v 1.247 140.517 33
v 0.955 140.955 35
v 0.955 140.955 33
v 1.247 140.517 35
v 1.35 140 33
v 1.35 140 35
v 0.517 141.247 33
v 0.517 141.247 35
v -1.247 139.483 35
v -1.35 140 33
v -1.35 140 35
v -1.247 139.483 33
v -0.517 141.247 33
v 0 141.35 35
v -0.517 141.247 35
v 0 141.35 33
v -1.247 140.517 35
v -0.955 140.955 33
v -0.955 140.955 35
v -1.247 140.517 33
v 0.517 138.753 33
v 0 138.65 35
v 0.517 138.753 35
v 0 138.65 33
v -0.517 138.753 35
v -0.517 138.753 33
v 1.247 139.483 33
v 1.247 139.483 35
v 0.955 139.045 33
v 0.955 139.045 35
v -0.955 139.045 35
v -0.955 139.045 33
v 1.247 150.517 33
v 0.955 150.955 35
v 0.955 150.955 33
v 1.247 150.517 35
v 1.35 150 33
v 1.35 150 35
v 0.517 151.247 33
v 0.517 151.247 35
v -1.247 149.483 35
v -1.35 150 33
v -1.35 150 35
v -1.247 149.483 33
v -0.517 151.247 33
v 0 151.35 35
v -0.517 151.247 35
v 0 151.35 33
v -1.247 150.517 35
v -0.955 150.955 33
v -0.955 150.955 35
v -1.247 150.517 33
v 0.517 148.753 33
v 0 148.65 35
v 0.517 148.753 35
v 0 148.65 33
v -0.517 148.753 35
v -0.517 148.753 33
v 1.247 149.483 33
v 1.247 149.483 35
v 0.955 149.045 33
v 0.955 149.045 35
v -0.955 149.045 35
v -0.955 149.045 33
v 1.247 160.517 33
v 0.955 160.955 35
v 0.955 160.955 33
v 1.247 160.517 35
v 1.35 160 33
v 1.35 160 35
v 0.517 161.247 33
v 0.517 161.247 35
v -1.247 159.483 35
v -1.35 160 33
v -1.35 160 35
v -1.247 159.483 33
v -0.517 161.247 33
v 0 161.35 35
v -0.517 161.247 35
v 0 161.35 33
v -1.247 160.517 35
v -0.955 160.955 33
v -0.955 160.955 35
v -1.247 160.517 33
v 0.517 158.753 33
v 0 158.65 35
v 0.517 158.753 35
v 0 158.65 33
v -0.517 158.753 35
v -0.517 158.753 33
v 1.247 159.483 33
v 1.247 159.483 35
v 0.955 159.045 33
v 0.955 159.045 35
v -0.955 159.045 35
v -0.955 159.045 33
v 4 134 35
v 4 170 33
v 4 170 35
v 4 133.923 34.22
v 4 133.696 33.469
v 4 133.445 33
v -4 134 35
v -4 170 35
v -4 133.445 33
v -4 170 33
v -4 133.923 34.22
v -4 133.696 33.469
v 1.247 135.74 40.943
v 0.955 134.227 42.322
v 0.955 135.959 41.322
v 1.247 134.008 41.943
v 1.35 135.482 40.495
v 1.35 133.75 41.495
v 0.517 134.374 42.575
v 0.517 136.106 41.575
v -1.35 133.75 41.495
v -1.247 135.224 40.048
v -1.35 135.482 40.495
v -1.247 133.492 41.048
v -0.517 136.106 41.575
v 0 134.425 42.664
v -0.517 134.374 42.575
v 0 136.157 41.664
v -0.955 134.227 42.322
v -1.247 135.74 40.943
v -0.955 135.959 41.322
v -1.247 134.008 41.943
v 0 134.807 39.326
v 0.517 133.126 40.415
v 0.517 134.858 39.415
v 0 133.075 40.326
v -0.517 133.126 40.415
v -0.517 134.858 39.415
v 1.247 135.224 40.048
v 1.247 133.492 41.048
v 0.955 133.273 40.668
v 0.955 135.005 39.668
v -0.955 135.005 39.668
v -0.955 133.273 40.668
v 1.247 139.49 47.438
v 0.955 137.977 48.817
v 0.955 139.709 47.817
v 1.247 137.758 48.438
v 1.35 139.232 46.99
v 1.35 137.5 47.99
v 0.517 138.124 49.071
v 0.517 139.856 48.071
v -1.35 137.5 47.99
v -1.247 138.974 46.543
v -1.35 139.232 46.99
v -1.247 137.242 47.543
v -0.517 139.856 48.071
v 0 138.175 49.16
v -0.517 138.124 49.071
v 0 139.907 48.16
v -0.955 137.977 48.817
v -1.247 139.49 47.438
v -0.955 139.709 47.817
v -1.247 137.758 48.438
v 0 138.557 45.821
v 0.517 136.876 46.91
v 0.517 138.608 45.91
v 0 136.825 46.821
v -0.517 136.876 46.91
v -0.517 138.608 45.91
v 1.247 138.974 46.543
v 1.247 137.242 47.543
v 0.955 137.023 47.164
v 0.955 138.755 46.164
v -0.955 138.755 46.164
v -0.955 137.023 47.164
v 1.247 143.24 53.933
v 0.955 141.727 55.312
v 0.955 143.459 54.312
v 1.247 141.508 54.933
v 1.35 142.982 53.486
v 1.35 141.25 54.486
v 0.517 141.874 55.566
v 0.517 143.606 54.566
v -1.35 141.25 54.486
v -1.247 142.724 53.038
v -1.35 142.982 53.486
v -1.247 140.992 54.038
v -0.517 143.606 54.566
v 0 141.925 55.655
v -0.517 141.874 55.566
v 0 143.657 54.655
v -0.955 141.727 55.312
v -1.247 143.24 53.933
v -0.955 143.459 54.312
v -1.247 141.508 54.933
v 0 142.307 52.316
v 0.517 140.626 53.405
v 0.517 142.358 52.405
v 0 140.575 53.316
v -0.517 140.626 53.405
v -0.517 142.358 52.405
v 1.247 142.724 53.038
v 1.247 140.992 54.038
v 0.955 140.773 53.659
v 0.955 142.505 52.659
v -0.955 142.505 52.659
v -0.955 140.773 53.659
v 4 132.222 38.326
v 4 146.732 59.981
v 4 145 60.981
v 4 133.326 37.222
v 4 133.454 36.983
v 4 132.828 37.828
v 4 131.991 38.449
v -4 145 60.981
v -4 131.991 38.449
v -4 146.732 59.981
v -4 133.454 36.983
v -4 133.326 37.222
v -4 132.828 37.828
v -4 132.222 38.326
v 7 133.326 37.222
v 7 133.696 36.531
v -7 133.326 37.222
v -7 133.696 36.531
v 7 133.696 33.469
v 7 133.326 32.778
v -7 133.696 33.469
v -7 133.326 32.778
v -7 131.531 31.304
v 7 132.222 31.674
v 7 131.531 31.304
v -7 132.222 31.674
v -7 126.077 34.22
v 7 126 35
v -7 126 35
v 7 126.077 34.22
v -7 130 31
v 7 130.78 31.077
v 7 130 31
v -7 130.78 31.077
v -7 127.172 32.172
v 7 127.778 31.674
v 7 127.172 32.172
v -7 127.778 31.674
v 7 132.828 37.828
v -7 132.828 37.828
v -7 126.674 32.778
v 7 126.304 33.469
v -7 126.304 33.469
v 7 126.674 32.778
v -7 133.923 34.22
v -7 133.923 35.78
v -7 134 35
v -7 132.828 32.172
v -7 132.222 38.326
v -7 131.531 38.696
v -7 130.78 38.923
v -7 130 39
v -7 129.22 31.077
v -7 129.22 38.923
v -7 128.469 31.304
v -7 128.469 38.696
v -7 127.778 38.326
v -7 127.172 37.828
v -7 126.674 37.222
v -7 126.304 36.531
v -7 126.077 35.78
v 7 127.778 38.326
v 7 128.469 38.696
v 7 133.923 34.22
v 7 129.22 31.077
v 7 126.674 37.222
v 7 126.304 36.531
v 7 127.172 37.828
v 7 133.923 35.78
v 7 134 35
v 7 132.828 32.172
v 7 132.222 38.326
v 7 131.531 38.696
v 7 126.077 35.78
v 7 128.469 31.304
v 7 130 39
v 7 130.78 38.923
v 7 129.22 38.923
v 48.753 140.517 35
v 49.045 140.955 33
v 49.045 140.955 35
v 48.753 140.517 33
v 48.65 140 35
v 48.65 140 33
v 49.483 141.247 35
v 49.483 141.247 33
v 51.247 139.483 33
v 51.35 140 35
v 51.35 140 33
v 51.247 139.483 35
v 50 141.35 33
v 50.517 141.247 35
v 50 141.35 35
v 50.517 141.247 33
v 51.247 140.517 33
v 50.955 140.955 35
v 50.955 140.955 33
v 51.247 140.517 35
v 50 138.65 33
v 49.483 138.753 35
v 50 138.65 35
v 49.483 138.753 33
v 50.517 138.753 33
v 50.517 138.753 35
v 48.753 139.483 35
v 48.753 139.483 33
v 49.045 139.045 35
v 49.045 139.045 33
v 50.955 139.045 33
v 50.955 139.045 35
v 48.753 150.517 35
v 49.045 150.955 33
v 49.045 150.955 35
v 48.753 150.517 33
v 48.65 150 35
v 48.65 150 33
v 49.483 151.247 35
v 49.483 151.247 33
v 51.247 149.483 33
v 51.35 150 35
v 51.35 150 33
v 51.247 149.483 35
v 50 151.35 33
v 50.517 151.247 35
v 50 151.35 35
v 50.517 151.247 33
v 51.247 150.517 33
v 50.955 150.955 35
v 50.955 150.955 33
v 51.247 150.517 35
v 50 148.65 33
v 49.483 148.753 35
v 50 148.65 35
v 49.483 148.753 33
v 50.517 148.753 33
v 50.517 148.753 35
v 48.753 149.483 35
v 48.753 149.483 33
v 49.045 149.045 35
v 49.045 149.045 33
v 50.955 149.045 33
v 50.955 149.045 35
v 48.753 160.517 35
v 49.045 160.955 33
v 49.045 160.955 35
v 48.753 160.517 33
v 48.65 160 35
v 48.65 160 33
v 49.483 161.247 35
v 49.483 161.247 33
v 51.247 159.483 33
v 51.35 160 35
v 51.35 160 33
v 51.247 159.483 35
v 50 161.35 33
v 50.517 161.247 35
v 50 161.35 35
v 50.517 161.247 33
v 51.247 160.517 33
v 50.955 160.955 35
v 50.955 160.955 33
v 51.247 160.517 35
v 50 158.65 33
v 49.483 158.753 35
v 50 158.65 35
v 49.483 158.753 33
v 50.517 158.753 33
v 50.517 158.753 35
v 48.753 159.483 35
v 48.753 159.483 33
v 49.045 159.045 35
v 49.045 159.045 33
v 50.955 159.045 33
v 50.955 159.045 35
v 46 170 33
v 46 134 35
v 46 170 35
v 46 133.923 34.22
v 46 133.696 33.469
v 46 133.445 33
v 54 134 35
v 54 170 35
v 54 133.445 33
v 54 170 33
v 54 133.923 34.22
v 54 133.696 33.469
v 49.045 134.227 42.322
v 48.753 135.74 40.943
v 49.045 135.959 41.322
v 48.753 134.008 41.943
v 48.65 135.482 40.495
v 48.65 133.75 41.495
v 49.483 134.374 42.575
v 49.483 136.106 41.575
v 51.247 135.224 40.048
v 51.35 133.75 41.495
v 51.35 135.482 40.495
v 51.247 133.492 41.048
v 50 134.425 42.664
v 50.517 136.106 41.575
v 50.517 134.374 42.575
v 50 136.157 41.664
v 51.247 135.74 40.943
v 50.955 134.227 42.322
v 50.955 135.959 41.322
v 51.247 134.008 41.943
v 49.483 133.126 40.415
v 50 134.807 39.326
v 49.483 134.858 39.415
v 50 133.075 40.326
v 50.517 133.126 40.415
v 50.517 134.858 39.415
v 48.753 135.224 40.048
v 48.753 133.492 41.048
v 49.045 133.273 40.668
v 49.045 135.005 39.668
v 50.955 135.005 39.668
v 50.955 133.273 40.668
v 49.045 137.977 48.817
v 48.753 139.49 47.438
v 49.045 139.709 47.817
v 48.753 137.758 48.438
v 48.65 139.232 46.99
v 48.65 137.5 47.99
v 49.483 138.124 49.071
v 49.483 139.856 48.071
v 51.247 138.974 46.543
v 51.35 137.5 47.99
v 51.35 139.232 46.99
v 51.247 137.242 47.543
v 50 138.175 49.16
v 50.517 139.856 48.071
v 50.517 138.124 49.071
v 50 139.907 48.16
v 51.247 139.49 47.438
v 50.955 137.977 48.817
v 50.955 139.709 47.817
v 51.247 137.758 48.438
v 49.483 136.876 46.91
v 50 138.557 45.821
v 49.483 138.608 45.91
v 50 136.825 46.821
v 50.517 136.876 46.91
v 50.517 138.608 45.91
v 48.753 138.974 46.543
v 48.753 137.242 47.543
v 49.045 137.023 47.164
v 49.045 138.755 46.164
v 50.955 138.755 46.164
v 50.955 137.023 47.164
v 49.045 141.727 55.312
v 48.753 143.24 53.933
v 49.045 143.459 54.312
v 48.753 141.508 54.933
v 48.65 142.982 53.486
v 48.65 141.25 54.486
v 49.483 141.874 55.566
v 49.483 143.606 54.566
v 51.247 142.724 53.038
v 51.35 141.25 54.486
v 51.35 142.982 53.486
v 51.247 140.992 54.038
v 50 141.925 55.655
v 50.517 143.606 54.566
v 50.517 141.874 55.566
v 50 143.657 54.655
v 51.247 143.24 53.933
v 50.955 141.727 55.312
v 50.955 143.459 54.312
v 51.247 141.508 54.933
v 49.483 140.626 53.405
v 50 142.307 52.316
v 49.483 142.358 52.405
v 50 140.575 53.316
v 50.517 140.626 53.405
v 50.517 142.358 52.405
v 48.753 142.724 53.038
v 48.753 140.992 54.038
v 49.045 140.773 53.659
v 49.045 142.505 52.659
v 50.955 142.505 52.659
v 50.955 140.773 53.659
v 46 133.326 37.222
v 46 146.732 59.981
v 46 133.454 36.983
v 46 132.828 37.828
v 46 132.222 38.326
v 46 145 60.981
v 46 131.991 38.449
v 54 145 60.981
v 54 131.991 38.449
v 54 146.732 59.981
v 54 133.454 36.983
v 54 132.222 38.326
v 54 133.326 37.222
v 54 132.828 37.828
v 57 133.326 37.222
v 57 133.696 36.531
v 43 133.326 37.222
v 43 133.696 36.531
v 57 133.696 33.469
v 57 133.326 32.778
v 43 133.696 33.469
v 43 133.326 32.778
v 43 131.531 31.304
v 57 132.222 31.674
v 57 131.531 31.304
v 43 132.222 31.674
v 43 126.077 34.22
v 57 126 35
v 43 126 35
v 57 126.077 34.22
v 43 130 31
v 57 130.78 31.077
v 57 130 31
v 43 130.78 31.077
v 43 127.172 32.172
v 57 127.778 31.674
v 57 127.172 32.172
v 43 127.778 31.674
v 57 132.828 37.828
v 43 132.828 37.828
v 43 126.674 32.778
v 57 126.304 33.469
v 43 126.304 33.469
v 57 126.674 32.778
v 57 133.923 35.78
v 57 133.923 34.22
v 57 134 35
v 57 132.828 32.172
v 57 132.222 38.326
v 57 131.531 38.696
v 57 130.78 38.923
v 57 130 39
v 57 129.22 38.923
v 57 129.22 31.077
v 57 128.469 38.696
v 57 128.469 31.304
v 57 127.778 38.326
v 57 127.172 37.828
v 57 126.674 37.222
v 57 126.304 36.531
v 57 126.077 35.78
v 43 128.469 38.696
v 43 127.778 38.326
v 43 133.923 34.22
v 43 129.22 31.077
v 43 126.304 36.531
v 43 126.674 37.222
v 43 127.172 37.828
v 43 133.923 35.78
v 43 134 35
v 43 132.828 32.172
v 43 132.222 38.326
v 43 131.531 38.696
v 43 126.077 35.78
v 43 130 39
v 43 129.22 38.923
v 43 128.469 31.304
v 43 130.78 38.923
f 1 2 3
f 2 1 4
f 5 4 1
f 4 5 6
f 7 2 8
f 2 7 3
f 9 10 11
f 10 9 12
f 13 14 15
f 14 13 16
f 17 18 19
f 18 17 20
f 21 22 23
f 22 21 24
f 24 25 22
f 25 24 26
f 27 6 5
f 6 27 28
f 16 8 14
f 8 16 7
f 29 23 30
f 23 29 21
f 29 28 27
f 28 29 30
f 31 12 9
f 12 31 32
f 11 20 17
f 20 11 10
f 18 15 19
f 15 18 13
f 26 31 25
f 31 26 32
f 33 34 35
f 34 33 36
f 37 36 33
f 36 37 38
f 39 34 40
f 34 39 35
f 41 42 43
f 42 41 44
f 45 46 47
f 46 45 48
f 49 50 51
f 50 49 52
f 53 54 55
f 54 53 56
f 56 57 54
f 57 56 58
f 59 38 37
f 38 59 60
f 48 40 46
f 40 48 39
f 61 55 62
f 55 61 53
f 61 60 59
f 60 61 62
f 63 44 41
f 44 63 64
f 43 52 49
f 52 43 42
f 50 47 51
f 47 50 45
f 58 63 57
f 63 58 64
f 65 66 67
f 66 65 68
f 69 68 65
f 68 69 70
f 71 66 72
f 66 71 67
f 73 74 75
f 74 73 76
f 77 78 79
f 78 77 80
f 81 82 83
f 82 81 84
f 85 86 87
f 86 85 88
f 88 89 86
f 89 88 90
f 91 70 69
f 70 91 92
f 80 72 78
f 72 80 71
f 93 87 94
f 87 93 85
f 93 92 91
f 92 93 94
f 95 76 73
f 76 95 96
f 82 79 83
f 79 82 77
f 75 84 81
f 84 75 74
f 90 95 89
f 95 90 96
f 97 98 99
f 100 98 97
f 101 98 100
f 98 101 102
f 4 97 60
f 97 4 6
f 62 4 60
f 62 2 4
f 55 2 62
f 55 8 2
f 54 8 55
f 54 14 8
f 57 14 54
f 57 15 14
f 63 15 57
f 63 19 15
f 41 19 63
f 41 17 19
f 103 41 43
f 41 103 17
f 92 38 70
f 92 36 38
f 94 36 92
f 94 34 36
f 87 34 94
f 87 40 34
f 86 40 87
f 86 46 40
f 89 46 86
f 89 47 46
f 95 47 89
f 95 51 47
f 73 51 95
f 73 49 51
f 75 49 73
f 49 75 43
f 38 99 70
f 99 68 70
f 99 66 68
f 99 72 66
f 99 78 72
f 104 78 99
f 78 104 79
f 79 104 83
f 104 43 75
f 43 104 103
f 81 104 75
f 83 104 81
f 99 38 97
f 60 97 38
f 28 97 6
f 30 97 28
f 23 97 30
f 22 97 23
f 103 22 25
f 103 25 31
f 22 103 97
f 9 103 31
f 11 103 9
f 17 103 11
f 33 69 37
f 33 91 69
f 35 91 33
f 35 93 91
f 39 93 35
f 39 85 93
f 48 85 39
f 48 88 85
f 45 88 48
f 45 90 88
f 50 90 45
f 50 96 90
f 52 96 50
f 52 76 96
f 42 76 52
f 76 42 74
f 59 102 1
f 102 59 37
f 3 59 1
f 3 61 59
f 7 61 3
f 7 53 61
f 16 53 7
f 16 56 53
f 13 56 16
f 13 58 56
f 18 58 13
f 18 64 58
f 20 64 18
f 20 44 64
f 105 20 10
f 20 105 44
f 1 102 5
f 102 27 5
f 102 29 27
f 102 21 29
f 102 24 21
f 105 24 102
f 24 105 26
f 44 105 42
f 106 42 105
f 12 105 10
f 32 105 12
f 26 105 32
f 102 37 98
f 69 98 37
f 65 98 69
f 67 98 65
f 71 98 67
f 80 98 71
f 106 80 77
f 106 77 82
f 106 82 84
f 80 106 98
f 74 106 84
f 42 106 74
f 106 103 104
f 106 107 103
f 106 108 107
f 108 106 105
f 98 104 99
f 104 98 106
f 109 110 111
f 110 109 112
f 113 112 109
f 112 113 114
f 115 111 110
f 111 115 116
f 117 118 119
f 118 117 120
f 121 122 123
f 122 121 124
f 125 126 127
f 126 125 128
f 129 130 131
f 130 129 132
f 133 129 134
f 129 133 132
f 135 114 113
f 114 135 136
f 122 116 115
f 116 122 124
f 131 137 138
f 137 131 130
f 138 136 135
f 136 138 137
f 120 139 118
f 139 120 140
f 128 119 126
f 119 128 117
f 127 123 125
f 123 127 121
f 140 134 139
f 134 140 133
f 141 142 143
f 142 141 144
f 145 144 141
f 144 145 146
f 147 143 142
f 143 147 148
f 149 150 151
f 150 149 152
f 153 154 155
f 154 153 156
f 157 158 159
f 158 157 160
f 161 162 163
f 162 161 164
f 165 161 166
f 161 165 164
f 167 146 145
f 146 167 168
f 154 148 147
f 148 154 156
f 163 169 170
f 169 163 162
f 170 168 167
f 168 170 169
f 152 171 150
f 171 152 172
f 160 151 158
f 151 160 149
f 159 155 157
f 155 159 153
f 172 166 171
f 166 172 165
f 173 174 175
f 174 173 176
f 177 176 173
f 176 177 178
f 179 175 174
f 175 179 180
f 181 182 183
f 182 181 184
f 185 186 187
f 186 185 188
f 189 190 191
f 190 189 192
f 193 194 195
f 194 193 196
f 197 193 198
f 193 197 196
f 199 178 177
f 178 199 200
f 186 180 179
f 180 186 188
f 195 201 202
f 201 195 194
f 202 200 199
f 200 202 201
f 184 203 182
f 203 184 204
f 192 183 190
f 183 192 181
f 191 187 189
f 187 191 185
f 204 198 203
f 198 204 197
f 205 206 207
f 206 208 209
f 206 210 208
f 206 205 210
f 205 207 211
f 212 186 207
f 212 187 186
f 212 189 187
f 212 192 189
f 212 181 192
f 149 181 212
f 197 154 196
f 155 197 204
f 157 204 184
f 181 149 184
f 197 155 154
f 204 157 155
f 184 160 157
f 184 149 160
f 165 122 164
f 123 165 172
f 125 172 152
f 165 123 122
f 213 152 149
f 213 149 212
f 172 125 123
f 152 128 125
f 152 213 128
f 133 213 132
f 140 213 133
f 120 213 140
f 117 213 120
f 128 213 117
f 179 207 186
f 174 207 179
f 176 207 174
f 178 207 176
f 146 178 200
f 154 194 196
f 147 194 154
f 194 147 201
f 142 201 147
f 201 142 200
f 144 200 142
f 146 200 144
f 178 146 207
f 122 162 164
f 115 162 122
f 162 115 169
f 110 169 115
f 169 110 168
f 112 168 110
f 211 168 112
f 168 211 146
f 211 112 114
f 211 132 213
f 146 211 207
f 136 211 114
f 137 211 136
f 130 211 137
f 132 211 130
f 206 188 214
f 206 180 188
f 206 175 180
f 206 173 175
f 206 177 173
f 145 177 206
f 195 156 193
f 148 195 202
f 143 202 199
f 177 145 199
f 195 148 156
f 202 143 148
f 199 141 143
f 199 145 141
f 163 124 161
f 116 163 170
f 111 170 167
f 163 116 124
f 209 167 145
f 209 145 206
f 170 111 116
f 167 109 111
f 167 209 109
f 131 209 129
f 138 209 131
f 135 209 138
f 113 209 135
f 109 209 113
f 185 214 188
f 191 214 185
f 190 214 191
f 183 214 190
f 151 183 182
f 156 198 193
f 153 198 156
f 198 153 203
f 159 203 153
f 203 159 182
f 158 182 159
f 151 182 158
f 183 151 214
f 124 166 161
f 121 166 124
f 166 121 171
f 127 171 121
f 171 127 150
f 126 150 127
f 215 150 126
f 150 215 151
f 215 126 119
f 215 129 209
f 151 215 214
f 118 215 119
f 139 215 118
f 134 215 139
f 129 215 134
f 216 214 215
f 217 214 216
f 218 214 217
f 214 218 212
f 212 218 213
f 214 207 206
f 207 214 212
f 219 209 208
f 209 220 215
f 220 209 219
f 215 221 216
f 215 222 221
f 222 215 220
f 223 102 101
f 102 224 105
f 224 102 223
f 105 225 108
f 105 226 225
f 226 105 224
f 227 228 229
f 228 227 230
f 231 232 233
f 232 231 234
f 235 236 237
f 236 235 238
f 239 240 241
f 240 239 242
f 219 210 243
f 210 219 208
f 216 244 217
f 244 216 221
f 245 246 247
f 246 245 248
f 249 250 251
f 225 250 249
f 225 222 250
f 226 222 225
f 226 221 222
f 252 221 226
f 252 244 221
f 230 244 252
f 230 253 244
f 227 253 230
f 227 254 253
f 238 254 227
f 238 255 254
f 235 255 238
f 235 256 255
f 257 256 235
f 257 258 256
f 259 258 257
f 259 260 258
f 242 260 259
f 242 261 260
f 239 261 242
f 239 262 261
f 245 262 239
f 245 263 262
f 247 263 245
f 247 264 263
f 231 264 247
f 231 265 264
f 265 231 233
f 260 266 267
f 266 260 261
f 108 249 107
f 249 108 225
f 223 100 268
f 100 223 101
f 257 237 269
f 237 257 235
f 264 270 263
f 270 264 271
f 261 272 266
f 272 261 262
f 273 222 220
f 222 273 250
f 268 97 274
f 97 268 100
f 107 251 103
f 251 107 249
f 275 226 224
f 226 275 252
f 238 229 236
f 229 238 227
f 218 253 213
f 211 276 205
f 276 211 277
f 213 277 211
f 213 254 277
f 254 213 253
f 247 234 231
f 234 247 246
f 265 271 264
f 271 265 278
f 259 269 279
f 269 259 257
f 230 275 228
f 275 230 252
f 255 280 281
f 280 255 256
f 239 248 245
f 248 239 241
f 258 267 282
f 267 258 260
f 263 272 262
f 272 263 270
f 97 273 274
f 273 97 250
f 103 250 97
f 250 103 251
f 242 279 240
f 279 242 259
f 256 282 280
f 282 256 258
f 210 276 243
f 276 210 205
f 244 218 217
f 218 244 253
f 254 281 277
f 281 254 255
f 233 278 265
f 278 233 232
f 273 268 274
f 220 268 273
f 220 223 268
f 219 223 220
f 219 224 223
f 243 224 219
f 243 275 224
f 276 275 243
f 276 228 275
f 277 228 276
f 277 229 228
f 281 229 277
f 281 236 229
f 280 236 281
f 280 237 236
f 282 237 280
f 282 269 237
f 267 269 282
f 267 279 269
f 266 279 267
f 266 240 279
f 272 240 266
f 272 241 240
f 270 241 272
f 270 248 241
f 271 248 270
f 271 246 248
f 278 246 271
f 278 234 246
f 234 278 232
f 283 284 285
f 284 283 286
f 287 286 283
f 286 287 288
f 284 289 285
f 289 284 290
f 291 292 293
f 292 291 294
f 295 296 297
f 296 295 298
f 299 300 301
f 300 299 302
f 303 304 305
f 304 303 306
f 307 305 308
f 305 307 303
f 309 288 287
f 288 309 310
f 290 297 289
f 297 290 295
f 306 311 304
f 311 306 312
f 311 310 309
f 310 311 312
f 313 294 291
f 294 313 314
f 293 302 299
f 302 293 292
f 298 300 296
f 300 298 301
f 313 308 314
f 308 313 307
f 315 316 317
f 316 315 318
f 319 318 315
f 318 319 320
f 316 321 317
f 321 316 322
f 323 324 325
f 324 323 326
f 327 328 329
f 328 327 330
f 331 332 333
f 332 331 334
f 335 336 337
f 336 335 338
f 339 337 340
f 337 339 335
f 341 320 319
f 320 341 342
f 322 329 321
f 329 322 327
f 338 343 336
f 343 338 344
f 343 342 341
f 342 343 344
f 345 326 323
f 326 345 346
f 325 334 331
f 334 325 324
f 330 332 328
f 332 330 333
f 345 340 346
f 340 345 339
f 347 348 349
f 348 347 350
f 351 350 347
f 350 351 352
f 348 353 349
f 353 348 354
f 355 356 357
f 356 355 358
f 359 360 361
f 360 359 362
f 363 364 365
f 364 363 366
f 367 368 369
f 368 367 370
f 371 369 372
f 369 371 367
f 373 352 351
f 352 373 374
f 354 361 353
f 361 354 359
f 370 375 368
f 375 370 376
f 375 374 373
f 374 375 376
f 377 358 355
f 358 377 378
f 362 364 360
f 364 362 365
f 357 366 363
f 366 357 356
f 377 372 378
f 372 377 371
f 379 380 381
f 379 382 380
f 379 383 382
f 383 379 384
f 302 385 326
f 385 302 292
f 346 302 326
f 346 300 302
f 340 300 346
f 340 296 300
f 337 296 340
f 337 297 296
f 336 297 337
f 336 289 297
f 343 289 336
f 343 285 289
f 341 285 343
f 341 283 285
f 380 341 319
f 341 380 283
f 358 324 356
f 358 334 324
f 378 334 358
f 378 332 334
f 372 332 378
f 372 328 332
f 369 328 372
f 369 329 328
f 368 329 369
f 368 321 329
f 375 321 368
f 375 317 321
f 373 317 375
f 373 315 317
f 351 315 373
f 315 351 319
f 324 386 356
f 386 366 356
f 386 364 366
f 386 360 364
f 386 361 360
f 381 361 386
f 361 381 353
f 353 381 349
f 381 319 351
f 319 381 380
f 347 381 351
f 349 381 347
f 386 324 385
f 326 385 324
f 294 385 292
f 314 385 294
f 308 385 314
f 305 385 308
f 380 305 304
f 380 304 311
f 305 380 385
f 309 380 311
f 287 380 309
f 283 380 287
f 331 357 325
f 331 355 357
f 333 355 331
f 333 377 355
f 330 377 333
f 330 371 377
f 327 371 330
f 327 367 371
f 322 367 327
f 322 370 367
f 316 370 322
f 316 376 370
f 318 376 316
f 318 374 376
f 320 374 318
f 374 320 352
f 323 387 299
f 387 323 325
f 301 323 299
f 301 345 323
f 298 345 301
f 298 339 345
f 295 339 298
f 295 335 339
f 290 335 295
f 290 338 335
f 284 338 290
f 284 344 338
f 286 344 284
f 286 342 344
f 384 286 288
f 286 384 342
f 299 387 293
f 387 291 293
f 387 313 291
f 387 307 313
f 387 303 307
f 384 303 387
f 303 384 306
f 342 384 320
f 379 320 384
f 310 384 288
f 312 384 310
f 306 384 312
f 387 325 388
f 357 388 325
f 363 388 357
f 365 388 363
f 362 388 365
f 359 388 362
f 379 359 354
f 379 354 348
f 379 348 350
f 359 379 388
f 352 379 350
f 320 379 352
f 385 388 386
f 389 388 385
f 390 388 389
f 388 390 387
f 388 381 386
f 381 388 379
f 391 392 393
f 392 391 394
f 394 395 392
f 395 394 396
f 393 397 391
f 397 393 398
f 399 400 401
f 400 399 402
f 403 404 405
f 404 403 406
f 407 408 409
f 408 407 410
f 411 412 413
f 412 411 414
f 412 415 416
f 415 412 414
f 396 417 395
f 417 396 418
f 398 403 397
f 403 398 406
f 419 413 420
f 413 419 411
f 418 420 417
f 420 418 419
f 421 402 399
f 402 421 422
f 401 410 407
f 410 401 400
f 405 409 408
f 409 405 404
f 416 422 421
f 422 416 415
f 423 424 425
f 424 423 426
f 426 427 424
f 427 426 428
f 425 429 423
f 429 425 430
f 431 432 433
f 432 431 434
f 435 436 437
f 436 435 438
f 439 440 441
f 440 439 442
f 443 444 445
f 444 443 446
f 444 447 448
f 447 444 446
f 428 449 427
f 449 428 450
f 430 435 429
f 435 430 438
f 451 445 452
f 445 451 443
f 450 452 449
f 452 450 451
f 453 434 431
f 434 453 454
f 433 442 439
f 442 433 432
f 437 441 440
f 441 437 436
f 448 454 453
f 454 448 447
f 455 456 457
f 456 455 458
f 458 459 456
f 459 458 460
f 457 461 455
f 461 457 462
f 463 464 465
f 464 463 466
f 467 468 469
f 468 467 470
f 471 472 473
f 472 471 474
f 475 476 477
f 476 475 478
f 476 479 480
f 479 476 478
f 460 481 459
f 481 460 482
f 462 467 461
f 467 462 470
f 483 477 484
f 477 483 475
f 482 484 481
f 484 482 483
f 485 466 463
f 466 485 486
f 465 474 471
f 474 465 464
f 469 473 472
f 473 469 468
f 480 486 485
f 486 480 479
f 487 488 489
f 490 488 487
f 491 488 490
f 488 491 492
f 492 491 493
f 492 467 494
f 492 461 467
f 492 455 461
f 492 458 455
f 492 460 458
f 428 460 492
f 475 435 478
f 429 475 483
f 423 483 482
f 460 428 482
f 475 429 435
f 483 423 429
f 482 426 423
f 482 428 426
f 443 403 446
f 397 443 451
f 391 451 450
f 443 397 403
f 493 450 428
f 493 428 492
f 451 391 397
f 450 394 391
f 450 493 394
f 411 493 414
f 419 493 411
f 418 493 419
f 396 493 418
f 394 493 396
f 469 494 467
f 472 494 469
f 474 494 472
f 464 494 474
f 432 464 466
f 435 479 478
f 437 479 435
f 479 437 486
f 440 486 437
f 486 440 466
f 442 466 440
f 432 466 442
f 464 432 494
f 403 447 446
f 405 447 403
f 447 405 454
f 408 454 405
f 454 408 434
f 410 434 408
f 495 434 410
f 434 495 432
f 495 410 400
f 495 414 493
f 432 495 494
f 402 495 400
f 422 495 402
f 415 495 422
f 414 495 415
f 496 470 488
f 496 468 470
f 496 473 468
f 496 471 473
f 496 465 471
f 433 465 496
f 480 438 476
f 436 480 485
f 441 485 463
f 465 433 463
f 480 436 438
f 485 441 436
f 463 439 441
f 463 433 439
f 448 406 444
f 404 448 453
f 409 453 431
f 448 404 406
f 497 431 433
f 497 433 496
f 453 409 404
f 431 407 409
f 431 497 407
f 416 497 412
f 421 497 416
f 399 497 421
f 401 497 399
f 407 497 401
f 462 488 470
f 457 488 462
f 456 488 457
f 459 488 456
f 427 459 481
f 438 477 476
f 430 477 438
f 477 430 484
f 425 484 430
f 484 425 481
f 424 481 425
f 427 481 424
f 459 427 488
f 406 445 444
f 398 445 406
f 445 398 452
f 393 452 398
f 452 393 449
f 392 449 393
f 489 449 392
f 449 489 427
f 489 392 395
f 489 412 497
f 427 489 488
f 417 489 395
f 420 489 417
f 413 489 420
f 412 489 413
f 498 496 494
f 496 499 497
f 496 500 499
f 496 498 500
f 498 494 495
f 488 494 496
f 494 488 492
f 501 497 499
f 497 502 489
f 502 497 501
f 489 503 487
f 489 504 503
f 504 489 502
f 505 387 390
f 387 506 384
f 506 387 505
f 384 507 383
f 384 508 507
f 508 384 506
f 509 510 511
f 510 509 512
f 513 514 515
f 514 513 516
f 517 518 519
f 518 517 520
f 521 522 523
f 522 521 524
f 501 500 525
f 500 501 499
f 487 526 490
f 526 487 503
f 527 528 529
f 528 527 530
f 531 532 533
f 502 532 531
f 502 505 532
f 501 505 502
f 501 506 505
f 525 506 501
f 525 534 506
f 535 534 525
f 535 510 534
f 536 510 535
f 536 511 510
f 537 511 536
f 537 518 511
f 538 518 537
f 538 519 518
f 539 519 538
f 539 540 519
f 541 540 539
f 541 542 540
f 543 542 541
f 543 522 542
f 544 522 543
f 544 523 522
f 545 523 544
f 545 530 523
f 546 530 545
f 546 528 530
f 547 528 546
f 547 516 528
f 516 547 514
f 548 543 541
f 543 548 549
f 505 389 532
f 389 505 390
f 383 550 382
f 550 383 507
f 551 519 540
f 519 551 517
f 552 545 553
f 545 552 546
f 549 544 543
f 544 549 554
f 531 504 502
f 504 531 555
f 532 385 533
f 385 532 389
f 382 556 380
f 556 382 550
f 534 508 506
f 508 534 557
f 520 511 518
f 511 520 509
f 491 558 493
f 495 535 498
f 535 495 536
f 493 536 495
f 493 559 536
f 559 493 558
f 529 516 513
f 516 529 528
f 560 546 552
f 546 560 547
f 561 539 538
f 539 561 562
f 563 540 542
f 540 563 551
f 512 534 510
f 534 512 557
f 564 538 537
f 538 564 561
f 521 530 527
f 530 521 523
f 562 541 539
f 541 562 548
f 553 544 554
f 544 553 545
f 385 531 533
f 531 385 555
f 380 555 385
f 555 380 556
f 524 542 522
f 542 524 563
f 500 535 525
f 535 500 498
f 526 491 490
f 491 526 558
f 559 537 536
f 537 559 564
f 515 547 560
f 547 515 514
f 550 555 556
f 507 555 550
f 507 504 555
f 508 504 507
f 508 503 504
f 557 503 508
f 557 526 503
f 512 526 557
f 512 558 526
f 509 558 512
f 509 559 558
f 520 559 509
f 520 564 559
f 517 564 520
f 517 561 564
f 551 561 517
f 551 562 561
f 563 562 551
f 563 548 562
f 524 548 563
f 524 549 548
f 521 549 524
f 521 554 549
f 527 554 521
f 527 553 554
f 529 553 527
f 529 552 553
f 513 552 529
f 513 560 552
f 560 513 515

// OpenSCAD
// ThinkPad-style pivot hinge for Piputer
//
// Principle (matches ThinkPad design):
//   • Barrel visible at the back, sitting at the step-wall top-outer corner.
//   • Base arm : flat plate extending in +Y from barrel → screws into rear-zone top face.
//   • Lid arm  : flat plate extending in −Y from barrel when closed → screws into lid back.
//   • No integral plastic knuckles — hinge is a separate part, fastened to both shells.
//
// Barrel axis : X (left-right).
// Module origin : barrel centre.
//
// Placement in Piputer world (see main.scad):
//   Left  hinge: tp_hinge(open_angle, side="left",  x_pos= 20, bar_y=D_front, bar_z=H_rear)
//   Right hinge: tp_hinge(open_angle, side="right", x_pos=206, bar_y=D_front, bar_z=H_rear)
//
// Verification (closed, open_angle=0):
//   Base arm top face at Z=0 (module) = world Z=H_rear=35 — flush with rear-zone top. ✓
//   Lid arm: extends −Y from barrel → world Y=130..100, inside lid body at Z=35. ✓

eps = 0.01;

BARREL_D   =  8;    // barrel outer Ø
BARREL_L   = 14;    // barrel length, centred on X (±7 mm)
ARM_W      =  8;    // arm width along X
ARM_T      =  2;    // arm thickness (sits below barrel centre, Z=−ARM_T..0)
ARM_L_BASE = 40;    // base arm length in +Y (into rear zone, world Y=130..170)
ARM_L_LID  = 30;    // lid arm length in −Y (into lid body, world Y=100..130 when closed)
HOLE_D     =  2.7;  // M2.5 clearance bore

// Single flat arm with equally-spaced M2.5 clearance holes.
// Top face at Z=0 (barrel centre height); extends in +Y.
module _tp_arm(arm_l, n_holes=3) {
    difference() {
        translate([-ARM_W/2, 0, -ARM_T])
            cube([ARM_W, arm_l, ARM_T]);
        for (i = [1 : n_holes])
            translate([0, arm_l / (n_holes + 1) * i, -ARM_T - eps])
                cylinder(h = ARM_T + 2*eps, d = HOLE_D, $fn = 16);
    }
}

// Complete ThinkPad-style hinge: barrel + base arm + lid arm.
//
// open_angle : 0 = closed, 120 = typical laptop open.
// side       : "left" or "right"  (mirror([1,0,0]) for right side).
// x_pos      : barrel centre X in world coords.
// bar_y/bar_z: barrel world position — defaults match Piputer (D_front=130, H_rear=35).
module tp_hinge(open_angle=0, side="left", x_pos=20,
                bar_y=130, bar_z=35) {
    flip = (side == "right") ? [1, 0, 0] : [0, 0, 0];

    color([0.15, 0.15, 0.15])
    translate([x_pos, bar_y, bar_z])
    mirror(flip) {
        // ── Barrel ────────────────────────────────────────────────────────
        rotate([0, 90, 0])
            cylinder(h = BARREL_L, d = BARREL_D, $fn = 32, center = true);

        // ── Base arm — fixed, lies on rear-zone top face ──────────────────
        // Top face at Z=0 → world Z=H_rear=35, flush with rear-zone top.
        // Extends in +Y → world Y=bar_y..bar_y+ARM_L_BASE (into rear zone).
        _tp_arm(ARM_L_BASE, n_holes = 3);

        // ── Lid arm — rotates with lid around barrel axis ─────────────────
        // rotate([180,0,0]): points arm in −Y (into lid body when closed).
        // rotate([−open_angle,0,0]): opens the lid (matches main.scad transform).
        rotate([-open_angle, 0, 0])
        rotate([180, 0, 0])
            _tp_arm(ARM_L_LID, n_holes = 3);
    }
}


// ── Preview ───────────────────────────────────────────────────────────────
tp_hinge(open_angle = 120, side = "left",  x_pos =  0);
translate([50, 0, 0])
    tp_hinge(open_angle = 120, side = "right", x_pos = 0);
